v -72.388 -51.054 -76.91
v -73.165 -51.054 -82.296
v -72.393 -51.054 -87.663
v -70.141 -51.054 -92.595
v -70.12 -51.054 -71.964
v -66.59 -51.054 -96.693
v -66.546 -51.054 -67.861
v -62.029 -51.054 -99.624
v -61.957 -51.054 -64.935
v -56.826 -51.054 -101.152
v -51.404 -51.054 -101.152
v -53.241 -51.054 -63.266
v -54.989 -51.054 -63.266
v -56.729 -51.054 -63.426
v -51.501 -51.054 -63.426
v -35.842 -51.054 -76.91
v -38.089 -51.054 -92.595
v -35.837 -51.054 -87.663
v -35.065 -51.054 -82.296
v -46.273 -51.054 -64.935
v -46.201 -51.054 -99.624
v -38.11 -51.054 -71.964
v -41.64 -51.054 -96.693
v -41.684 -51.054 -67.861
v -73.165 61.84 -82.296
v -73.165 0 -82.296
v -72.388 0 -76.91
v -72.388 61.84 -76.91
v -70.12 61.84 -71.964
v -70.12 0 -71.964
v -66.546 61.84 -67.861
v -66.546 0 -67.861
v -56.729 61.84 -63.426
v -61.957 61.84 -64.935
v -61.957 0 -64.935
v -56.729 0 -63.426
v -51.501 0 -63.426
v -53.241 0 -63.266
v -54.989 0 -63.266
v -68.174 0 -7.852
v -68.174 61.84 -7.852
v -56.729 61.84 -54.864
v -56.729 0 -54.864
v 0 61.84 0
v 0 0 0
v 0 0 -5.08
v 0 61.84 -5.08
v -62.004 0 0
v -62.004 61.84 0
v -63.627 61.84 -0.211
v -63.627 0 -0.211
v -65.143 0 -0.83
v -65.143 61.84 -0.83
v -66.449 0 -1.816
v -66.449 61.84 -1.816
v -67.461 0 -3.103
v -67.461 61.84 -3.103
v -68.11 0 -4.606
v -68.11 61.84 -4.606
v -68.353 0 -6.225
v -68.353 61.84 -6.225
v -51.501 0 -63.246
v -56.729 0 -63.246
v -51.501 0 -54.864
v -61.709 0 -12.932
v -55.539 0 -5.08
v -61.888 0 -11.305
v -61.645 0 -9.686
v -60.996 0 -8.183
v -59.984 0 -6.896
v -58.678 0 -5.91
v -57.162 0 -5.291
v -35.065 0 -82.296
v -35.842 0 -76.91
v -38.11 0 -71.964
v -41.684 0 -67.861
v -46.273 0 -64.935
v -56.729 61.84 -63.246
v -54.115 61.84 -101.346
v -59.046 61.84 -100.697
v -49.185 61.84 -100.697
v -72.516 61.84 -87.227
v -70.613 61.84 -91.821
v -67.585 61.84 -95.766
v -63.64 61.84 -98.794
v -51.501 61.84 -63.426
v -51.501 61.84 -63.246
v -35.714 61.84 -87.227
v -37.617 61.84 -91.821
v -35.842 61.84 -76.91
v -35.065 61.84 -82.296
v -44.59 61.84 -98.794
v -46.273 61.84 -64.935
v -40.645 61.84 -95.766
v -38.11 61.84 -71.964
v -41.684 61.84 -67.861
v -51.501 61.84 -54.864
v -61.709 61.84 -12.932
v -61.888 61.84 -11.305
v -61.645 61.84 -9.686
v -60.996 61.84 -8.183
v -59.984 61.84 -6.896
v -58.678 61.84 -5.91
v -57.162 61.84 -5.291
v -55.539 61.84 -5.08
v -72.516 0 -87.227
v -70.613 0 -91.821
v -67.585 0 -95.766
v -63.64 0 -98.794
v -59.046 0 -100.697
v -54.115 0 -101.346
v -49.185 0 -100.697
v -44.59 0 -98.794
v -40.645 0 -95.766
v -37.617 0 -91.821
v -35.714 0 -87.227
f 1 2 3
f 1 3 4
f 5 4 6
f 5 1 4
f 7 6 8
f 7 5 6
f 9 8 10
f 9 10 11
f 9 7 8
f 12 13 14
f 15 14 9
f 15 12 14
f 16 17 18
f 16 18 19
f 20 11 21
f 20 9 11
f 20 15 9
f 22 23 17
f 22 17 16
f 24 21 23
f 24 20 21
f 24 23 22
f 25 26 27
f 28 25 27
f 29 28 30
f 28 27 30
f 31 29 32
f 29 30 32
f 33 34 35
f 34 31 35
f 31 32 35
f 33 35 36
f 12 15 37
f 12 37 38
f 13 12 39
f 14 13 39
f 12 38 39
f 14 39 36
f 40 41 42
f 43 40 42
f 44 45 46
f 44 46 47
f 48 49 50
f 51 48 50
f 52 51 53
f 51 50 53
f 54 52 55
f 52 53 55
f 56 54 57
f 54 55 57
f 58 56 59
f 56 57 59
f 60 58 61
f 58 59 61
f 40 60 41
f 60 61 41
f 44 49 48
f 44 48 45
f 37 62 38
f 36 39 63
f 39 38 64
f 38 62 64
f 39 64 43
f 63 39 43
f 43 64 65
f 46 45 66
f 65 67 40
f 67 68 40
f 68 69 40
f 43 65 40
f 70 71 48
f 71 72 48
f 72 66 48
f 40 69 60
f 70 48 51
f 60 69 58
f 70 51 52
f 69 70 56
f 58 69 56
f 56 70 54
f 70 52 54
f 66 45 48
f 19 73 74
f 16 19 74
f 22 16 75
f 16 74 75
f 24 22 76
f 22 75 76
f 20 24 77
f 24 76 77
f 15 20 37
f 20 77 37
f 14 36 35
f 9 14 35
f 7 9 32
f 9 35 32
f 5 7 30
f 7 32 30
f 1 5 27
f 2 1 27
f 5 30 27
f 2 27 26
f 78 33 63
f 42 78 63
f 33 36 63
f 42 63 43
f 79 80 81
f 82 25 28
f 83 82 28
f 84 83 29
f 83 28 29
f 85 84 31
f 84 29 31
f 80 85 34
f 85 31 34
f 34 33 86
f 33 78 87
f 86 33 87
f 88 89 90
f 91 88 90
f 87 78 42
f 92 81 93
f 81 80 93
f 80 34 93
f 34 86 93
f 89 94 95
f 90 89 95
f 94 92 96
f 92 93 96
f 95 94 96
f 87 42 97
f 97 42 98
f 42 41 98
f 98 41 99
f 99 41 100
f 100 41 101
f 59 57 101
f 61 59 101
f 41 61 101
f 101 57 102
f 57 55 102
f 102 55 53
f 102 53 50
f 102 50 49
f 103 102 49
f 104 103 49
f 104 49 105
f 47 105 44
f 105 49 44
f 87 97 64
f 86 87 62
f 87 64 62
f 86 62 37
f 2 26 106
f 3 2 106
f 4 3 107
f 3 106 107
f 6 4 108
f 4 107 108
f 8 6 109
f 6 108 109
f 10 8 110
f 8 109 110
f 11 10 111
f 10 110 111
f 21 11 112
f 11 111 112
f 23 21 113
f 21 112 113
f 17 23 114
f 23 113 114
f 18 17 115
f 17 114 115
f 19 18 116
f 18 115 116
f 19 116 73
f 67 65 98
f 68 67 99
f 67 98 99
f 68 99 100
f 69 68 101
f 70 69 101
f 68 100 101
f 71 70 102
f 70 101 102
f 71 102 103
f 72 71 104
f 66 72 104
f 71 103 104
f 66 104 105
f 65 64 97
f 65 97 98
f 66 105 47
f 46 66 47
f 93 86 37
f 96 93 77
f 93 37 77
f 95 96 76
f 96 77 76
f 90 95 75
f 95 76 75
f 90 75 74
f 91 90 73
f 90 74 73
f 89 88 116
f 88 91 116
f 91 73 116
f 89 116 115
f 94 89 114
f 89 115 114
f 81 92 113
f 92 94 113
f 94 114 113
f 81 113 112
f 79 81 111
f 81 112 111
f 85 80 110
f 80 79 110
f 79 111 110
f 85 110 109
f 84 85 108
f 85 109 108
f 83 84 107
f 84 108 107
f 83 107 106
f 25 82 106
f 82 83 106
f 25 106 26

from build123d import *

# Parameters (mm, degrees)
F0_W      = 70.085093379
F0_H      = 61.8397891521
F1_DEPTH  = 54.864
F3_DEPTH  = 61.8407891521
F4_W      = 5.2283558833
F4_H      = 61.8397891521
F5_DEPTH  = 8.382
F6_W      = 5.2283558833
F6_H      = 61.8397891521
F6_W_2    = 16.4358220583
F7_DEPTH  = 38.1
F9_DEPTH  = 25.4
F10_DEPTH = 36.4407891521
F12_DEPTH = 51.054


# Not quite as in the source:
# - after a boolean that leaves OpenCascade's solid faulty, fix() repairs it


with BuildPart() as f1:
    # F0 (on Top) → F1 (new body)
    with BuildSketch(Plane.XY):
        with Locations((-35.0425466895, 30.9198945761)):
            Rectangle(F0_W, F0_H)
    extrude(amount=-F1_DEPTH)

    # F2 (on face) → F3 (cut, through all)
    with BuildSketch(Plane(origin=(0, 61.8397891521, 0), x_dir=(-1, 0, 0), z_dir=(0, 1, 0))):
        with BuildLine():
            Line((0, -54.864), (51.500908674, -54.864))
            Line((51.500908674, -54.864), (61.7086454928, -12.9319506824))
            ThreePointArc((61.7086454928, -12.9319506824), (60.5318177305, -7.5066651196), (55.5388283037, -5.08))
            Line((55.5388283037, -5.08), (52.6744276285, -5.08))
            Line((52.6744276285, -5.08), (0, -5.08))
            Line((0, -5.08), (0, -54.864))
        make_face()
        with BuildLine():
            ThreePointArc((62.0038350038, 0), (66.9968244307, -2.4266651196), (68.173652193, -7.8519506824))
            Line((68.173652193, -7.8519506824), (56.7292645574, -54.864))
            Line((56.7292645574, -54.864), (70.085093379, -54.864))
            Line((70.085093379, -54.864), (70.085093379, 0))
            Line((70.085093379, 0), (62.0038350038, 0))
        make_face()
    extrude(amount=-F3_DEPTH, mode=Mode.SUBTRACT)

    # F4 (on face) → F5 (join)
    with BuildSketch(Plane(origin=(0, 0, -54.864), x_dir=(1, 0, 0), z_dir=(0, 0, -1))):
        with Locations((-54.1150866157, -30.9198945761)):
            Rectangle(F4_W, F4_H)
    extrude(amount=F5_DEPTH)

    # F6 (on face) → F7 (join)
    with BuildSketch(Plane(origin=(0, 0, -63.246), x_dir=(1, 0, 0), z_dir=(0, 0, -1))):
        with Locations((-54.1150866157, -30.9198945761)):
            Rectangle(F6_W, F6_H)
        with Locations((-43.2829976449, -30.9198945761)):
            Rectangle(F6_W_2, F6_H)
        with Locations((-64.9471755865, -30.9198945761)):
            Rectangle(F6_W_2, F6_H)
    extrude(amount=F7_DEPTH)

    # F8 (on face) → F9 (cut)
    with BuildSketch(Plane.XZ):
        with BuildLine():
            ThreePointArc((-51.500908674, -63.4262206243), (-39.7501537967, -69.7839575966), (-35.0650866157, -82.296))
            Line((-35.0650866157, -82.296), (-35.0650866157, -63.246))
            Line((-35.0650866157, -63.246), (-51.500908674, -63.246))
            Line((-51.500908674, -63.246), (-51.500908674, -63.4262206243))
        make_face()
        with BuildLine():
            ThreePointArc((-73.1650866157, -82.296), (-68.4800194347, -69.7839575966), (-56.7292645574, -63.4262206243))
            Line((-56.7292645574, -63.4262206243), (-56.7292645574, -63.246))
            Line((-56.7292645574, -63.246), (-73.1650866157, -63.246))
            Line((-73.1650866157, -63.246), (-73.1650866157, -82.296))
        make_face()
        with BuildLine():
            Line((-35.0650866157, -101.346), (-35.0650866157, -82.296))
            ThreePointArc((-35.0650866157, -82.296), (-40.6447024341, -95.7663841816), (-54.1150866157, -101.346))
            Line((-54.1150866157, -101.346), (-35.0650866157, -101.346))
        make_face()
        with BuildLine():
            Line((-73.1650866157, -101.346), (-54.1150866157, -101.346))
            ThreePointArc((-54.1150866157, -101.346), (-67.5854707973, -95.7663841816), (-73.1650866157, -82.296))
            Line((-73.1650866157, -82.296), (-73.1650866157, -101.346))
        make_face()
    extrude(amount=-F9_DEPTH, mode=Mode.SUBTRACT)

    # F10 (cut, through all): faces of the model
    f10_faces = [f1.faces().sort_by_distance(p)[0] for p in [
        (-39.2943641898, 25.4, -67.5096317249),
        (-39.3202458526, 25.4, -97.0908407631),
        (-68.9099273788, 25.4, -97.0908407631),
        (-68.9358090416, 25.4, -67.5096317249),
    ]]
    extrude(f10_faces, amount=-F10_DEPTH, mode=Mode.SUBTRACT)

    # F11 (on face) → F12 (join)
    with BuildSketch(Plane.XZ):
        with BuildLine():
            ThreePointArc((-73.1650866157, -82.296), (-54.1150866157, -101.346), (-35.0650866157, -82.296))
            ThreePointArc((-35.0650866157, -82.296), (-39.7501537967, -69.7839575966), (-51.500908674, -63.4262206243))
            ThreePointArc((-51.500908674, -63.4262206243), (-54.1150866157, -63.246), (-56.7292645574, -63.4262206243))
            ThreePointArc((-56.7292645574, -63.4262206243), (-68.4800194347, -69.7839575966), (-73.1650866157, -82.296))
        make_face()
    extrude(amount=F12_DEPTH)

    add(f1.part.fix(), mode=Mode.REPLACE)


solid = f1.part
